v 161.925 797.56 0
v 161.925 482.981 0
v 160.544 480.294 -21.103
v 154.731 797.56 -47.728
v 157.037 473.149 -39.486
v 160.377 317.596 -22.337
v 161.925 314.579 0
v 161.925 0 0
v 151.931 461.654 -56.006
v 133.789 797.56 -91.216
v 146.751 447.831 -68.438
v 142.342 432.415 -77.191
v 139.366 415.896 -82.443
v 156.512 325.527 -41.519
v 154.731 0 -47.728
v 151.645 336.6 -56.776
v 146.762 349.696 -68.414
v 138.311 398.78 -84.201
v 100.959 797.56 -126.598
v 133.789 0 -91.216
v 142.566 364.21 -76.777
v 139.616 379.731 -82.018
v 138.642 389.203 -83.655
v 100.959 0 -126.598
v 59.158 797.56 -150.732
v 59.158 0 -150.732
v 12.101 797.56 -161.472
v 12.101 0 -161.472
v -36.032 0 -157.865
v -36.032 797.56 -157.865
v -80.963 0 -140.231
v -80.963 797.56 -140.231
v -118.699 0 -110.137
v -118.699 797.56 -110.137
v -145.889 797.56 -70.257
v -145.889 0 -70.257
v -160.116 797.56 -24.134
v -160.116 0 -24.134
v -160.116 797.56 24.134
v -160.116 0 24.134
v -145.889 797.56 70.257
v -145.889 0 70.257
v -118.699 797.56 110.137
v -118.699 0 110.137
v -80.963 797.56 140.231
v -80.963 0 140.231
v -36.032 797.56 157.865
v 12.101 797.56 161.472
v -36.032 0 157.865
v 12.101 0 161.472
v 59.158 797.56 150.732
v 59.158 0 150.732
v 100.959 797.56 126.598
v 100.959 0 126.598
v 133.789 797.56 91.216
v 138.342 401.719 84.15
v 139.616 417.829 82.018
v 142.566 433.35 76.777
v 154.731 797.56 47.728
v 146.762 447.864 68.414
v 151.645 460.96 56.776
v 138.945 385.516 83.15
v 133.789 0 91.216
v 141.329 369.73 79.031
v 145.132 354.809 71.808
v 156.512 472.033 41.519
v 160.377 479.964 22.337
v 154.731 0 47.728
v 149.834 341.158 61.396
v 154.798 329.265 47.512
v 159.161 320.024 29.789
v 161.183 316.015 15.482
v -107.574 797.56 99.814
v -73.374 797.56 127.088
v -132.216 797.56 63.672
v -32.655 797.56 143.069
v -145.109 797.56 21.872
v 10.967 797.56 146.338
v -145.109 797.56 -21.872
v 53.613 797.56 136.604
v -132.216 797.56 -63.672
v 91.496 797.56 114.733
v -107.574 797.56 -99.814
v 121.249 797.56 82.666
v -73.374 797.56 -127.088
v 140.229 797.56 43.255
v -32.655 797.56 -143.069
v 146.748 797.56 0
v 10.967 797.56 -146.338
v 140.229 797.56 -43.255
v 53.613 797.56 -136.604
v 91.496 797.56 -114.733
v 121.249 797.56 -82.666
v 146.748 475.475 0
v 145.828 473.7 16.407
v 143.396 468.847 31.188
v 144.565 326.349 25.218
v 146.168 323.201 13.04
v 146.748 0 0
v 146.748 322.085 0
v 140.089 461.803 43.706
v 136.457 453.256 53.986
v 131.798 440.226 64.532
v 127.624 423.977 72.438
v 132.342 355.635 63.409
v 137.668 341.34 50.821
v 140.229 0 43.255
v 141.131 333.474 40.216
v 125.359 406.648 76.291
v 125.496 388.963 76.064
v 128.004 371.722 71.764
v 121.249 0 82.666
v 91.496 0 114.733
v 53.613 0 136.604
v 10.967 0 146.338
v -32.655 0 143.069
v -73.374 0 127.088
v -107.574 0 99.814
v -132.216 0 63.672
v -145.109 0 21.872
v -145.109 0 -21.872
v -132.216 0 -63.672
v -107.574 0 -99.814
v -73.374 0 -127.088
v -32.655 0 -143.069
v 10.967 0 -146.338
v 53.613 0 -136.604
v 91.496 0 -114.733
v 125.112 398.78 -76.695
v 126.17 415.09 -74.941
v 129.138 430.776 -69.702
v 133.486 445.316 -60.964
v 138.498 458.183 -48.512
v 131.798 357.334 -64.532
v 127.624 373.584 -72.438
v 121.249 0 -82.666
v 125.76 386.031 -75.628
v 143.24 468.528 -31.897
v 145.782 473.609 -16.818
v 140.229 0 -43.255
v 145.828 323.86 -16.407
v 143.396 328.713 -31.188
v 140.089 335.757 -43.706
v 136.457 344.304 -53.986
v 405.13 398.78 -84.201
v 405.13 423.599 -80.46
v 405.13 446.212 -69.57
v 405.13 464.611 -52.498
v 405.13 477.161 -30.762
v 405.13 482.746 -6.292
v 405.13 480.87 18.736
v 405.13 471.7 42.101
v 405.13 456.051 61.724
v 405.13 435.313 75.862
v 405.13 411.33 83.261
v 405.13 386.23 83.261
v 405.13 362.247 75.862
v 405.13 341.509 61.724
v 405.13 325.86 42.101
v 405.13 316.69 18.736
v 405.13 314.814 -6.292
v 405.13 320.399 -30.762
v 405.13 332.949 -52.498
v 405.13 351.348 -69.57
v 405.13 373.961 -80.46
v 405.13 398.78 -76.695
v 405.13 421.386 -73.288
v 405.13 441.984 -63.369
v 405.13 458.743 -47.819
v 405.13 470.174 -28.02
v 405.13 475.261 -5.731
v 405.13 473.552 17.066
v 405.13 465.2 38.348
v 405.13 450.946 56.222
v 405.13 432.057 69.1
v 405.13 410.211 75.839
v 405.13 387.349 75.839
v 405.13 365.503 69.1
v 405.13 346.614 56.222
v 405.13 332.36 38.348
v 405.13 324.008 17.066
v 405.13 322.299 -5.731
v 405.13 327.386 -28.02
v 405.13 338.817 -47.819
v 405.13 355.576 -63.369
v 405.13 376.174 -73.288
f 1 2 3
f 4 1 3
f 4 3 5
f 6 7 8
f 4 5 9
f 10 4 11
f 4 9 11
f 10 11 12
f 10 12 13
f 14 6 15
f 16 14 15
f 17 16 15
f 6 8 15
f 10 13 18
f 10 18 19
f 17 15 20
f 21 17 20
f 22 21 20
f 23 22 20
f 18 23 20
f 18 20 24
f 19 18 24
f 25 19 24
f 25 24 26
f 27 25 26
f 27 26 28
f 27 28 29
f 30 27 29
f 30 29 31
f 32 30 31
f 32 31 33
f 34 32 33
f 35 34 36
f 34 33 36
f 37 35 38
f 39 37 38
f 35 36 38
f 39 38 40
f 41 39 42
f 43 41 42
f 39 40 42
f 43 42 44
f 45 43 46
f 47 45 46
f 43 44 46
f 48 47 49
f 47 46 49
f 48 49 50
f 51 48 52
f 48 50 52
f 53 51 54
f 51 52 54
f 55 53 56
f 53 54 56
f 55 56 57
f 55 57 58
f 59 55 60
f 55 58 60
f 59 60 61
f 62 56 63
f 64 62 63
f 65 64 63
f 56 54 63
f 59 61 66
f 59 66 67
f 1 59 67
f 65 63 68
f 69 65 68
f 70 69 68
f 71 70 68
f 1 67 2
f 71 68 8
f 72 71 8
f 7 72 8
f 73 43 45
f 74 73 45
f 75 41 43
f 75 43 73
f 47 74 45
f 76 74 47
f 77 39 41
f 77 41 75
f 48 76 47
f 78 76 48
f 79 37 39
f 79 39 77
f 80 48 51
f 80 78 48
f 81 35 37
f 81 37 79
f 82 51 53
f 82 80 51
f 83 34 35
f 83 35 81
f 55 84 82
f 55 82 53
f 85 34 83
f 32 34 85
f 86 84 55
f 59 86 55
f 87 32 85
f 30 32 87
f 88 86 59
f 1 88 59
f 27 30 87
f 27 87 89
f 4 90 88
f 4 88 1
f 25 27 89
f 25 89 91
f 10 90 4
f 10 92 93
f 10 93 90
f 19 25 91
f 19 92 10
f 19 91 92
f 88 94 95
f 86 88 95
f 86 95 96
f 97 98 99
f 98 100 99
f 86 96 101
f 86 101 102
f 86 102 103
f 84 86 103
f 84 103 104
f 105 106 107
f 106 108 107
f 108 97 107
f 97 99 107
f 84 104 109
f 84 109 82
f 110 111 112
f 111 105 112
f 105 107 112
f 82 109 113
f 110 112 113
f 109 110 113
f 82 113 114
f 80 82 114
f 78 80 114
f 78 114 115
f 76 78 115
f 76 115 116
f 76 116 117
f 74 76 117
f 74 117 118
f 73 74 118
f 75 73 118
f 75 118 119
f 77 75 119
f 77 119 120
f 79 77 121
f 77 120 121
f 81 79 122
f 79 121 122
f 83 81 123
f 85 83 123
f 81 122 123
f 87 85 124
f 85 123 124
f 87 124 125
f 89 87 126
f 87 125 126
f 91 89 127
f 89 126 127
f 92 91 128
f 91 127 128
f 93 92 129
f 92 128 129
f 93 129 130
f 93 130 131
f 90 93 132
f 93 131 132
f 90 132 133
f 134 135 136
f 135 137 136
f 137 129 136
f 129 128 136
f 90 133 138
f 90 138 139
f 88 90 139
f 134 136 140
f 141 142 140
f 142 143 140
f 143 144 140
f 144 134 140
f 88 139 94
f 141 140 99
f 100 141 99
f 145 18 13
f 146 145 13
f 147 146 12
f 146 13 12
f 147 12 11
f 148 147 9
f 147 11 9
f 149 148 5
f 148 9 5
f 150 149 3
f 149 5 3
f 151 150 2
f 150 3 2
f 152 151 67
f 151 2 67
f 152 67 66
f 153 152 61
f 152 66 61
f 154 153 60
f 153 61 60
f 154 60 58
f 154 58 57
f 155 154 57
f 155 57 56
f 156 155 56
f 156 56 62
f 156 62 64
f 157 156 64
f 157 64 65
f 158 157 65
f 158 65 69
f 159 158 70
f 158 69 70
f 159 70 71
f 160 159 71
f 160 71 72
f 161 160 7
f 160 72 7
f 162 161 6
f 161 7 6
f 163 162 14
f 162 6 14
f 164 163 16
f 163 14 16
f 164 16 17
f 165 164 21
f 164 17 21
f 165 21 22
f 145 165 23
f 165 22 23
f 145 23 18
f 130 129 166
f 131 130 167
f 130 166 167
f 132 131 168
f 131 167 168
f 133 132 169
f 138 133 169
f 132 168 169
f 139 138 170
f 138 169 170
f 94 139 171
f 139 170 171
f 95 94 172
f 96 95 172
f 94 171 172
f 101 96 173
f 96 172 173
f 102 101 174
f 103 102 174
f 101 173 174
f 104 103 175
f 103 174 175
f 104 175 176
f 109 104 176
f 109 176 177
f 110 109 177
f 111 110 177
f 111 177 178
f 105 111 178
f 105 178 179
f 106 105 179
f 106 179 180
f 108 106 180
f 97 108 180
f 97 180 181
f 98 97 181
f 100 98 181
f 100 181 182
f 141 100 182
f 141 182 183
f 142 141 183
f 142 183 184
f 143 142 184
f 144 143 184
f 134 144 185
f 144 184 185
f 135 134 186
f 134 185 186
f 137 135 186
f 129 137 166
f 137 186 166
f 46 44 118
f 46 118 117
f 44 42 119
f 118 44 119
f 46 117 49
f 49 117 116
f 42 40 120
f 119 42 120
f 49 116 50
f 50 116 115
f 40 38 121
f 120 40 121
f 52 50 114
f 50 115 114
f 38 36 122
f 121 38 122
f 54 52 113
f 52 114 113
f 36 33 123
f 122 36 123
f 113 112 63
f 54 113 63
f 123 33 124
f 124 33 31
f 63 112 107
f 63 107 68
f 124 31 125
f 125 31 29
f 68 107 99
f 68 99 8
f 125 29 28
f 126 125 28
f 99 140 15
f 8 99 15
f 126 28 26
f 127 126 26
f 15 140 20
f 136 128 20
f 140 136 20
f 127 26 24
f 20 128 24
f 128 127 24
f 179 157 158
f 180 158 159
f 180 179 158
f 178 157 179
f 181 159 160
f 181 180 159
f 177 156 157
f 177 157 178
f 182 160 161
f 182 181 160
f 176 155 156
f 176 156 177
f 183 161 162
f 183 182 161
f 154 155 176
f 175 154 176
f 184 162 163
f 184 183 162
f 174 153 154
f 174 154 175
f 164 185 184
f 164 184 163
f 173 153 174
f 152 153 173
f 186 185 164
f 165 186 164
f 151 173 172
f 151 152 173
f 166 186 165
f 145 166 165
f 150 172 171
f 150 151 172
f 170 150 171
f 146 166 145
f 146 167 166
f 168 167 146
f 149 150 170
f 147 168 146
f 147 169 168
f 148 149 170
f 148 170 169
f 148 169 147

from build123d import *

# Parameters (mm, degrees)
SKETCH1_R           = 161.925
BOSS_EXTRUDE1_DEPTH = 797.56
SKETCH2_R           = 84.201
BOSS_EXTRUDE2_DEPTH = 405.13
SKETCH3_R           = 146.7485
CUT_EXTRUDE1_DEPTH  = 798.5600001
CUT_EXTRUDE2_REACH  = 569.055
SKETCH4_R           = 76.6953


with BuildPart() as part:
    # Sketch1 → Boss-Extrude1 (new body)
    with BuildSketch(Plane(origin=(0, 0, 0), x_dir=(1, 0, 0), z_dir=(0, 1, 0))):
        Circle(SKETCH1_R)
    extrude(amount=BOSS_EXTRUDE1_DEPTH)

    # Sketch2 → Boss-Extrude2 (add)
    with BuildSketch(Plane(origin=(0, 0, 0), x_dir=(0, 0, -1), z_dir=(1, 0, 0))):
        with Locations((0, 398.78)):
            Circle(SKETCH2_R)
    extrude(amount=BOSS_EXTRUDE2_DEPTH)

    # Sketch3 → Cut-Extrude1 (cut, through all)
    with BuildSketch(Plane.XZ):
        Circle(SKETCH3_R)
    extrude(amount=-CUT_EXTRUDE1_DEPTH, mode=Mode.SUBTRACT)

    # Sketch4 → Cut-Extrude2 (cut, up to next)
    with BuildSketch(Plane(origin=(405.13, 0, 0), x_dir=(0, 0, -1), z_dir=(1, 0, 0)), mode=Mode.PRIVATE) as cut_extrude2_sk1:
        with Locations((0, 398.78)):
            Circle(SKETCH4_R)
    cut_extrude2_tool1 = extrude(cut_extrude2_sk1.sketch, amount=-CUT_EXTRUDE2_REACH, mode=Mode.PRIVATE) & part.part
    add(cut_extrude2_tool1.solids().sort_by_distance((405.13, 398.78, 0))[0], mode=Mode.SUBTRACT)


solid = part.part
